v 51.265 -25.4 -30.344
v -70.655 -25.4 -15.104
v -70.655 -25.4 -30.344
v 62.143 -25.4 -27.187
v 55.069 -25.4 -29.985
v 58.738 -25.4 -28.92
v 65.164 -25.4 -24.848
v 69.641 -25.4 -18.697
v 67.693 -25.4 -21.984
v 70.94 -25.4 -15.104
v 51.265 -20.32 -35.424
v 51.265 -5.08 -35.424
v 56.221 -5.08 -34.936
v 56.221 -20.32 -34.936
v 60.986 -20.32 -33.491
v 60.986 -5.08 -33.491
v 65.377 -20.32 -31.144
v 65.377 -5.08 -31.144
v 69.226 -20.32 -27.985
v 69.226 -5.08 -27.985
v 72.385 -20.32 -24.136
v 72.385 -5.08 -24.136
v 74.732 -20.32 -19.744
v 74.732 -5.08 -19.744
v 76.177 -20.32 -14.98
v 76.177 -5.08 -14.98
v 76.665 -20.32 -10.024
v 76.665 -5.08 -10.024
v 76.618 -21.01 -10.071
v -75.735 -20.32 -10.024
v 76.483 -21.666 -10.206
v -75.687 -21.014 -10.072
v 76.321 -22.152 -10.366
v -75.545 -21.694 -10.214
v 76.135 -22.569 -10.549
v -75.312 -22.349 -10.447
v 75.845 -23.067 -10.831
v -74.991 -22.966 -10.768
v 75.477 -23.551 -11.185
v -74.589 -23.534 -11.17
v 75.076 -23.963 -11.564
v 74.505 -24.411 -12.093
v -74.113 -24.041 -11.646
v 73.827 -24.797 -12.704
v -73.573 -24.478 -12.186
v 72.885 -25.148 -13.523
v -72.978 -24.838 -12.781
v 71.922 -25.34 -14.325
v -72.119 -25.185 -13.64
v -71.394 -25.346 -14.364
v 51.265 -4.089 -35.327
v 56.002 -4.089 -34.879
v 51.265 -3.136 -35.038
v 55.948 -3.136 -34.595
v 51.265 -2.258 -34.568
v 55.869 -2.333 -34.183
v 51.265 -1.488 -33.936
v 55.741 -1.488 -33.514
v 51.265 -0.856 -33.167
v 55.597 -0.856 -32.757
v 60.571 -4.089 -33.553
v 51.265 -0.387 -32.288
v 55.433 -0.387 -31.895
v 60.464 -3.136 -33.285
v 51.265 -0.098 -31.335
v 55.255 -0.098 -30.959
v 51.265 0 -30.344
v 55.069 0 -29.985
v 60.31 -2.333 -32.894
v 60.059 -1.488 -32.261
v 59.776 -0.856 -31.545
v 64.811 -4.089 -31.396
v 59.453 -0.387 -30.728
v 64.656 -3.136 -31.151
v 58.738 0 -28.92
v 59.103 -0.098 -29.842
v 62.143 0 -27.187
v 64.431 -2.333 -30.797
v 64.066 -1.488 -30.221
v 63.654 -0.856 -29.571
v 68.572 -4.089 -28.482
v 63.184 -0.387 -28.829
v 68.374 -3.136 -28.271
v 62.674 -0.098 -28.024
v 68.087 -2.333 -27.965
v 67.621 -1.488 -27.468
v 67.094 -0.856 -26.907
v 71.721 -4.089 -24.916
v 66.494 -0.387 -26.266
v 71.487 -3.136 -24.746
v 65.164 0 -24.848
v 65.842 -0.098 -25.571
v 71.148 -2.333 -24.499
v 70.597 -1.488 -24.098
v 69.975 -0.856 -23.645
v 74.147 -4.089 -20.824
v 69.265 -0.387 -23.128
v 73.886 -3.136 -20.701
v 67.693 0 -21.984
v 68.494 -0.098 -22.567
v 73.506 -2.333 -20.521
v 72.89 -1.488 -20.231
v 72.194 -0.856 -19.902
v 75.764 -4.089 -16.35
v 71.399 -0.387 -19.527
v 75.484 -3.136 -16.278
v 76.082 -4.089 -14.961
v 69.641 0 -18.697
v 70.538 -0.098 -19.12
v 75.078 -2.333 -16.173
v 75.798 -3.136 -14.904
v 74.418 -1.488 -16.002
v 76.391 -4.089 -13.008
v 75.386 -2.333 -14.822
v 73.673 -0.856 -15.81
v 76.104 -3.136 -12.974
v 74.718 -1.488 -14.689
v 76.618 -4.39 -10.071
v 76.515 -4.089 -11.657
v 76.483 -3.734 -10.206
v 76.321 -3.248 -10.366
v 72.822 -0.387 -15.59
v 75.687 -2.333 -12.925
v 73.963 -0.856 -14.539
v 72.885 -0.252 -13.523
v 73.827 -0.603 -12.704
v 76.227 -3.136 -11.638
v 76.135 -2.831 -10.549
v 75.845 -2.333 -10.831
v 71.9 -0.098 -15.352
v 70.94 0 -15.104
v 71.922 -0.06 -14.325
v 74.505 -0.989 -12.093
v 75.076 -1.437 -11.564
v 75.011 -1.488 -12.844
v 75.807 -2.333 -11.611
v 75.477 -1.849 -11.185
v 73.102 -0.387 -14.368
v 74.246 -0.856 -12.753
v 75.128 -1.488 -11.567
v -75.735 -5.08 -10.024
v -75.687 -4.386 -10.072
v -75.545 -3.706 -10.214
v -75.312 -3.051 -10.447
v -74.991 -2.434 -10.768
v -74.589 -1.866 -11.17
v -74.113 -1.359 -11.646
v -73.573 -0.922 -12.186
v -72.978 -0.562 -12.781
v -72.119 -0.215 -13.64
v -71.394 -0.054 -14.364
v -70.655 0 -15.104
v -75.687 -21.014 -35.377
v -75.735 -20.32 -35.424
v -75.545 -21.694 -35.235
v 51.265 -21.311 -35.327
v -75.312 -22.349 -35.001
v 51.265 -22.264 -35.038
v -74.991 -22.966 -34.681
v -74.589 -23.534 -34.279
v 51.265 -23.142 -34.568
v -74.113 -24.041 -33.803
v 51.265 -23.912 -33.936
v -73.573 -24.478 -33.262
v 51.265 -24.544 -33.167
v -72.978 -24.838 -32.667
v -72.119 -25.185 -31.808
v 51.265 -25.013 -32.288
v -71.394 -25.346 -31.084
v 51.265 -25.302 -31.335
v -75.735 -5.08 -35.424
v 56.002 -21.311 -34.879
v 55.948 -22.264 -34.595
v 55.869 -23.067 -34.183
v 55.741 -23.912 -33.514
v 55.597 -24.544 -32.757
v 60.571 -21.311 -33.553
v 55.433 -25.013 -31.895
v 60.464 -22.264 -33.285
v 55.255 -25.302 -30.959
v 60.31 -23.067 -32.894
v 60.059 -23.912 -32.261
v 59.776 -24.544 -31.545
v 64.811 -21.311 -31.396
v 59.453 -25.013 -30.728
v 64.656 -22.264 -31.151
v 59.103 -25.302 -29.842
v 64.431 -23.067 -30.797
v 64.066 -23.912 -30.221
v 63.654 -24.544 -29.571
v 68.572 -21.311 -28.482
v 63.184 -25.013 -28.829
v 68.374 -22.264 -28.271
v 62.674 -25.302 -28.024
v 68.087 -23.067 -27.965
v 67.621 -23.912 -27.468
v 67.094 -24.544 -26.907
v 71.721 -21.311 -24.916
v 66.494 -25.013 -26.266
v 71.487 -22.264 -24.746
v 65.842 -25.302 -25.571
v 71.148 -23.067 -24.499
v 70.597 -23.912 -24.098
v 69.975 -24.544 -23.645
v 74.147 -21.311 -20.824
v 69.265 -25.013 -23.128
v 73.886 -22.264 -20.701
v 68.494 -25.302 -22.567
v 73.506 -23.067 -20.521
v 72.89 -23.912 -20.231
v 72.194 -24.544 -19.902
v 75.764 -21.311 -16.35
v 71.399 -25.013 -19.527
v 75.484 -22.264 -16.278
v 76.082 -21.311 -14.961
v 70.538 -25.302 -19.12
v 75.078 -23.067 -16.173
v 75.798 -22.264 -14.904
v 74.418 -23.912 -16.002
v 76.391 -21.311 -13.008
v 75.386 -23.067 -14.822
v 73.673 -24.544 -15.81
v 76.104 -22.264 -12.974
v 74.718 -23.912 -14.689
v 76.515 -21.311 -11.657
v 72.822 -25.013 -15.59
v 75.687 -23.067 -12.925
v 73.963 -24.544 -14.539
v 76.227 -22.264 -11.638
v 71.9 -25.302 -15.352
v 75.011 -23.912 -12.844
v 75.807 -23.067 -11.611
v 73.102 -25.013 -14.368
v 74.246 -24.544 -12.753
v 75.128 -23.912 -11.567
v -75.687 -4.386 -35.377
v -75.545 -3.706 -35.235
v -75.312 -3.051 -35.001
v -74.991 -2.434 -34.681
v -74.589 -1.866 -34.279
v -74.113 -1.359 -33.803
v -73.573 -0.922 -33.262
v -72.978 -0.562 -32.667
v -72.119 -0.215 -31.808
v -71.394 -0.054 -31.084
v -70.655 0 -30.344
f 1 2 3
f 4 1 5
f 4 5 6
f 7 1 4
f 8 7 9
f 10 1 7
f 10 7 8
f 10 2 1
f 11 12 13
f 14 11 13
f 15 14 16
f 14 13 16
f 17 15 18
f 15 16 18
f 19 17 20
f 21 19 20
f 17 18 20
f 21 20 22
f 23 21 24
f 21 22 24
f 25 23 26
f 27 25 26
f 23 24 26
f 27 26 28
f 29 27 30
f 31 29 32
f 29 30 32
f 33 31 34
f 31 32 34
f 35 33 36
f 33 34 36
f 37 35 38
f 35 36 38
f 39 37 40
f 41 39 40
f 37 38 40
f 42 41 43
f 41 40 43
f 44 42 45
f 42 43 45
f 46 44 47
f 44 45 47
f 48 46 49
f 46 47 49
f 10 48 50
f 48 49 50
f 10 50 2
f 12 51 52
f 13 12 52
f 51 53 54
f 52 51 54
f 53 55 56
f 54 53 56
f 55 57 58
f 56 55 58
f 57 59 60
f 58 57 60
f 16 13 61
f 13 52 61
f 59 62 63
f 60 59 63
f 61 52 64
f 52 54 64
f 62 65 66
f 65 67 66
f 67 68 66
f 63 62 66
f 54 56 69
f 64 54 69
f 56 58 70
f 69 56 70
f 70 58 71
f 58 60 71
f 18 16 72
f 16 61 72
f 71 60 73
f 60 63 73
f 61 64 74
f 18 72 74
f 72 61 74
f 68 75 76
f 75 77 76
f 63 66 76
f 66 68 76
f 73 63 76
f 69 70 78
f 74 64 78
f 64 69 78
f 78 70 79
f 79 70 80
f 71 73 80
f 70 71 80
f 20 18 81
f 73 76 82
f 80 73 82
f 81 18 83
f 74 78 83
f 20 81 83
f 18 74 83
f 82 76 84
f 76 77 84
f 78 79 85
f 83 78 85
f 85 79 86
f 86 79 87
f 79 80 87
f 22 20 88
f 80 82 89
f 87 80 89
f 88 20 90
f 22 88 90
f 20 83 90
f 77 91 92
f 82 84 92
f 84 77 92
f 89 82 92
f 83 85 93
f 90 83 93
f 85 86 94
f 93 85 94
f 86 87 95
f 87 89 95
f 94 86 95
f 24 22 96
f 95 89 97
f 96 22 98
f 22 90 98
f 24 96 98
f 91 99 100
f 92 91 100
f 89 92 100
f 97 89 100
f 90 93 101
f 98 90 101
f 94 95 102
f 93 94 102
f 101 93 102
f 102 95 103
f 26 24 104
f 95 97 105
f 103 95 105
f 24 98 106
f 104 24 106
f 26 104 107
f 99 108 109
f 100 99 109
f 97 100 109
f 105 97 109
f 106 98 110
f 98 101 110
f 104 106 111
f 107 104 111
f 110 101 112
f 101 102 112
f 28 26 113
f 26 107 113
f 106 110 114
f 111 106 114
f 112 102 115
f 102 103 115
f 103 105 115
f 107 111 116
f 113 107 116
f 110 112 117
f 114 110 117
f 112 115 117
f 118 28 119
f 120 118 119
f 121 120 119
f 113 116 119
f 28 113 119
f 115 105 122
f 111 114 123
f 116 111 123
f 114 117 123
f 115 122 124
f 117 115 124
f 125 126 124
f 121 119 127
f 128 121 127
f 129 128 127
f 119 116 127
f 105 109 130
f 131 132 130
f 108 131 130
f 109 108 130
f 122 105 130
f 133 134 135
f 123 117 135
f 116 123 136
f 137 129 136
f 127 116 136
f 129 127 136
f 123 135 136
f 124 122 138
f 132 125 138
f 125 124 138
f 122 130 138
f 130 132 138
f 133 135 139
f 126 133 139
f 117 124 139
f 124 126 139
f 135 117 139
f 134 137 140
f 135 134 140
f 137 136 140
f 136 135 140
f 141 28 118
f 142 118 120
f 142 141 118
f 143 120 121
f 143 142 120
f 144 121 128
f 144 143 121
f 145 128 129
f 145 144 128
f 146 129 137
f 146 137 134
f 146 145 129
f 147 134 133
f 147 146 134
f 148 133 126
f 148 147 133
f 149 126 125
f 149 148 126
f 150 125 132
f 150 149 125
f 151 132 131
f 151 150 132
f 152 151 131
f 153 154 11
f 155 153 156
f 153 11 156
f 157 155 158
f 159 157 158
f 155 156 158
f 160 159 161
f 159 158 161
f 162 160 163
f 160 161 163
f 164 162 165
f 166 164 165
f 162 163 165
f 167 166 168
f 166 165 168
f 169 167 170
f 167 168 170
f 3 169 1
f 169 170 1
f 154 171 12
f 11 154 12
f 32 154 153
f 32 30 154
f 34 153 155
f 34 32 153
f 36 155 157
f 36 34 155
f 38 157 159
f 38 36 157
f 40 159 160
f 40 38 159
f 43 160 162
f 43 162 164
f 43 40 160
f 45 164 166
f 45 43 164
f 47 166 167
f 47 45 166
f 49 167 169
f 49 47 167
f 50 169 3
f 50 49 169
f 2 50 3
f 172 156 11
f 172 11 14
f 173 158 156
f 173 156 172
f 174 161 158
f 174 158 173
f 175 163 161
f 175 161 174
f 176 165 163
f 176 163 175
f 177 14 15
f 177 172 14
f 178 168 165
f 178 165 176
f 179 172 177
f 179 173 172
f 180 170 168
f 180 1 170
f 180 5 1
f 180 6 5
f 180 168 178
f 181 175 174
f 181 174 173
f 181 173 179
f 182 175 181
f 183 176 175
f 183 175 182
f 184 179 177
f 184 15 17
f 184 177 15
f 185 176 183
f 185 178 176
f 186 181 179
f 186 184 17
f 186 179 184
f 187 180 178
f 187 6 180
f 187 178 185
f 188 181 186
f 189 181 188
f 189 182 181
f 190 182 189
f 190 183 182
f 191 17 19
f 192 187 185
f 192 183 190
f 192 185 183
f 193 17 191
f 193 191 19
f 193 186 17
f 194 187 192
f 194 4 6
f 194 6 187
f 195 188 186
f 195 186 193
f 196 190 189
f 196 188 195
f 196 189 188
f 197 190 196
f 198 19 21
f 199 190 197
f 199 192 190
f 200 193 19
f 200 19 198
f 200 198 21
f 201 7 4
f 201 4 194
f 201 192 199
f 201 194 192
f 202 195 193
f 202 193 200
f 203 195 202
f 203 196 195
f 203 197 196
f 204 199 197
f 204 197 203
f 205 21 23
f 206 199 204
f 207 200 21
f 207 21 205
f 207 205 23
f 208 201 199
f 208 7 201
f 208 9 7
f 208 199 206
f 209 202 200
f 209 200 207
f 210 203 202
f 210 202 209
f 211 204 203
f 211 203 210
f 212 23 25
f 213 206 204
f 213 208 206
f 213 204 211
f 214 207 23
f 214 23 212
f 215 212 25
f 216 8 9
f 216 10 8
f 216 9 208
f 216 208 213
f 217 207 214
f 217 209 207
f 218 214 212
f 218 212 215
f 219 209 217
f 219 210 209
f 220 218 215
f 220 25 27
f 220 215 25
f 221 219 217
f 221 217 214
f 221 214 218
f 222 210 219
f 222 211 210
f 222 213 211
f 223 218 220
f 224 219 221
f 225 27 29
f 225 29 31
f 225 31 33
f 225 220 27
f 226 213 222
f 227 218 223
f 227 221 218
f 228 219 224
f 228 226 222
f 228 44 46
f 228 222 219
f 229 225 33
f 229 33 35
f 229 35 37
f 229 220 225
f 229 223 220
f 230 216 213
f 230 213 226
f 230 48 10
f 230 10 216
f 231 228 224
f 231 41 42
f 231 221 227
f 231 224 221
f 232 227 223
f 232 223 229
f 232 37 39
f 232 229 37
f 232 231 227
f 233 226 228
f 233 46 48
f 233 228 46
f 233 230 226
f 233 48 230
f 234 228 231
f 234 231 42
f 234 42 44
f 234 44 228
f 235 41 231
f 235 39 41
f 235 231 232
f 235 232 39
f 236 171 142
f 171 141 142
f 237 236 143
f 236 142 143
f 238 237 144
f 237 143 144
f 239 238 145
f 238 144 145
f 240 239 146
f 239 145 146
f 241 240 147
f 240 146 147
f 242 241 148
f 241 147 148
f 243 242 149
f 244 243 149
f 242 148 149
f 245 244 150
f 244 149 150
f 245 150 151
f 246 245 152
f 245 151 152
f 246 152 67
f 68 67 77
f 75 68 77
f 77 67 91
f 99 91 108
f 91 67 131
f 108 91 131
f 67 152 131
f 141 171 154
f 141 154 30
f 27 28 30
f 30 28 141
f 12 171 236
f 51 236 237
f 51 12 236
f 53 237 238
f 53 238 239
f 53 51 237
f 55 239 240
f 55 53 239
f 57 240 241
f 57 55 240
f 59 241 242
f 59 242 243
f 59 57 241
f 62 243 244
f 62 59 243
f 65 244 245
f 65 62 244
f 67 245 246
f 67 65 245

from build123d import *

# Parameters (mm, degrees)
F0_W     = 127
F0_H     = 25.4
F1_DEPTH = 25.4
F2_R     = 5.08


# Not quite as in the source:
# - a feature names something its author has since deleted; it is built from what else it names


with BuildPart() as f1:
    # F0 (on Front) → F1 (new body)
    with BuildSketch(Plane.XZ):
        with Locations((-12.2346525788, -22.7242771864)):
            Rectangle(F0_W, F0_H)
        with BuildLine():
            Line((76.6653474212, -10.0242771864), (51.2653474212, -10.0242771864))
            Line((51.2653474212, -10.0242771864), (51.2653474212, -35.4242771864))
            ThreePointArc((51.2653474212, -35.4242771864), (69.2258596633, -27.9847894285), (76.6653474212, -10.0242771864))
        make_face()
    extrude(amount=F1_DEPTH)

    # F2
    f2_edges = [f1.edges().sort_by_distance(p)[0] for p in [
        (-75.734653, -25.4, -22.724277),
        (-12.234653, -25.4, -35.424277),
        (69.22586, -25.4, -27.984789),
        (0.465347, -25.4, -10.024277),
        (-75.734653, 0, -22.724277),
        (-12.234653, 0, -35.424277),
        (69.22586, 0, -27.984789),
        (0.465347, 0, -10.024277),
    ]]
    fillet(f2_edges, radius=F2_R)


solid = f1.part
